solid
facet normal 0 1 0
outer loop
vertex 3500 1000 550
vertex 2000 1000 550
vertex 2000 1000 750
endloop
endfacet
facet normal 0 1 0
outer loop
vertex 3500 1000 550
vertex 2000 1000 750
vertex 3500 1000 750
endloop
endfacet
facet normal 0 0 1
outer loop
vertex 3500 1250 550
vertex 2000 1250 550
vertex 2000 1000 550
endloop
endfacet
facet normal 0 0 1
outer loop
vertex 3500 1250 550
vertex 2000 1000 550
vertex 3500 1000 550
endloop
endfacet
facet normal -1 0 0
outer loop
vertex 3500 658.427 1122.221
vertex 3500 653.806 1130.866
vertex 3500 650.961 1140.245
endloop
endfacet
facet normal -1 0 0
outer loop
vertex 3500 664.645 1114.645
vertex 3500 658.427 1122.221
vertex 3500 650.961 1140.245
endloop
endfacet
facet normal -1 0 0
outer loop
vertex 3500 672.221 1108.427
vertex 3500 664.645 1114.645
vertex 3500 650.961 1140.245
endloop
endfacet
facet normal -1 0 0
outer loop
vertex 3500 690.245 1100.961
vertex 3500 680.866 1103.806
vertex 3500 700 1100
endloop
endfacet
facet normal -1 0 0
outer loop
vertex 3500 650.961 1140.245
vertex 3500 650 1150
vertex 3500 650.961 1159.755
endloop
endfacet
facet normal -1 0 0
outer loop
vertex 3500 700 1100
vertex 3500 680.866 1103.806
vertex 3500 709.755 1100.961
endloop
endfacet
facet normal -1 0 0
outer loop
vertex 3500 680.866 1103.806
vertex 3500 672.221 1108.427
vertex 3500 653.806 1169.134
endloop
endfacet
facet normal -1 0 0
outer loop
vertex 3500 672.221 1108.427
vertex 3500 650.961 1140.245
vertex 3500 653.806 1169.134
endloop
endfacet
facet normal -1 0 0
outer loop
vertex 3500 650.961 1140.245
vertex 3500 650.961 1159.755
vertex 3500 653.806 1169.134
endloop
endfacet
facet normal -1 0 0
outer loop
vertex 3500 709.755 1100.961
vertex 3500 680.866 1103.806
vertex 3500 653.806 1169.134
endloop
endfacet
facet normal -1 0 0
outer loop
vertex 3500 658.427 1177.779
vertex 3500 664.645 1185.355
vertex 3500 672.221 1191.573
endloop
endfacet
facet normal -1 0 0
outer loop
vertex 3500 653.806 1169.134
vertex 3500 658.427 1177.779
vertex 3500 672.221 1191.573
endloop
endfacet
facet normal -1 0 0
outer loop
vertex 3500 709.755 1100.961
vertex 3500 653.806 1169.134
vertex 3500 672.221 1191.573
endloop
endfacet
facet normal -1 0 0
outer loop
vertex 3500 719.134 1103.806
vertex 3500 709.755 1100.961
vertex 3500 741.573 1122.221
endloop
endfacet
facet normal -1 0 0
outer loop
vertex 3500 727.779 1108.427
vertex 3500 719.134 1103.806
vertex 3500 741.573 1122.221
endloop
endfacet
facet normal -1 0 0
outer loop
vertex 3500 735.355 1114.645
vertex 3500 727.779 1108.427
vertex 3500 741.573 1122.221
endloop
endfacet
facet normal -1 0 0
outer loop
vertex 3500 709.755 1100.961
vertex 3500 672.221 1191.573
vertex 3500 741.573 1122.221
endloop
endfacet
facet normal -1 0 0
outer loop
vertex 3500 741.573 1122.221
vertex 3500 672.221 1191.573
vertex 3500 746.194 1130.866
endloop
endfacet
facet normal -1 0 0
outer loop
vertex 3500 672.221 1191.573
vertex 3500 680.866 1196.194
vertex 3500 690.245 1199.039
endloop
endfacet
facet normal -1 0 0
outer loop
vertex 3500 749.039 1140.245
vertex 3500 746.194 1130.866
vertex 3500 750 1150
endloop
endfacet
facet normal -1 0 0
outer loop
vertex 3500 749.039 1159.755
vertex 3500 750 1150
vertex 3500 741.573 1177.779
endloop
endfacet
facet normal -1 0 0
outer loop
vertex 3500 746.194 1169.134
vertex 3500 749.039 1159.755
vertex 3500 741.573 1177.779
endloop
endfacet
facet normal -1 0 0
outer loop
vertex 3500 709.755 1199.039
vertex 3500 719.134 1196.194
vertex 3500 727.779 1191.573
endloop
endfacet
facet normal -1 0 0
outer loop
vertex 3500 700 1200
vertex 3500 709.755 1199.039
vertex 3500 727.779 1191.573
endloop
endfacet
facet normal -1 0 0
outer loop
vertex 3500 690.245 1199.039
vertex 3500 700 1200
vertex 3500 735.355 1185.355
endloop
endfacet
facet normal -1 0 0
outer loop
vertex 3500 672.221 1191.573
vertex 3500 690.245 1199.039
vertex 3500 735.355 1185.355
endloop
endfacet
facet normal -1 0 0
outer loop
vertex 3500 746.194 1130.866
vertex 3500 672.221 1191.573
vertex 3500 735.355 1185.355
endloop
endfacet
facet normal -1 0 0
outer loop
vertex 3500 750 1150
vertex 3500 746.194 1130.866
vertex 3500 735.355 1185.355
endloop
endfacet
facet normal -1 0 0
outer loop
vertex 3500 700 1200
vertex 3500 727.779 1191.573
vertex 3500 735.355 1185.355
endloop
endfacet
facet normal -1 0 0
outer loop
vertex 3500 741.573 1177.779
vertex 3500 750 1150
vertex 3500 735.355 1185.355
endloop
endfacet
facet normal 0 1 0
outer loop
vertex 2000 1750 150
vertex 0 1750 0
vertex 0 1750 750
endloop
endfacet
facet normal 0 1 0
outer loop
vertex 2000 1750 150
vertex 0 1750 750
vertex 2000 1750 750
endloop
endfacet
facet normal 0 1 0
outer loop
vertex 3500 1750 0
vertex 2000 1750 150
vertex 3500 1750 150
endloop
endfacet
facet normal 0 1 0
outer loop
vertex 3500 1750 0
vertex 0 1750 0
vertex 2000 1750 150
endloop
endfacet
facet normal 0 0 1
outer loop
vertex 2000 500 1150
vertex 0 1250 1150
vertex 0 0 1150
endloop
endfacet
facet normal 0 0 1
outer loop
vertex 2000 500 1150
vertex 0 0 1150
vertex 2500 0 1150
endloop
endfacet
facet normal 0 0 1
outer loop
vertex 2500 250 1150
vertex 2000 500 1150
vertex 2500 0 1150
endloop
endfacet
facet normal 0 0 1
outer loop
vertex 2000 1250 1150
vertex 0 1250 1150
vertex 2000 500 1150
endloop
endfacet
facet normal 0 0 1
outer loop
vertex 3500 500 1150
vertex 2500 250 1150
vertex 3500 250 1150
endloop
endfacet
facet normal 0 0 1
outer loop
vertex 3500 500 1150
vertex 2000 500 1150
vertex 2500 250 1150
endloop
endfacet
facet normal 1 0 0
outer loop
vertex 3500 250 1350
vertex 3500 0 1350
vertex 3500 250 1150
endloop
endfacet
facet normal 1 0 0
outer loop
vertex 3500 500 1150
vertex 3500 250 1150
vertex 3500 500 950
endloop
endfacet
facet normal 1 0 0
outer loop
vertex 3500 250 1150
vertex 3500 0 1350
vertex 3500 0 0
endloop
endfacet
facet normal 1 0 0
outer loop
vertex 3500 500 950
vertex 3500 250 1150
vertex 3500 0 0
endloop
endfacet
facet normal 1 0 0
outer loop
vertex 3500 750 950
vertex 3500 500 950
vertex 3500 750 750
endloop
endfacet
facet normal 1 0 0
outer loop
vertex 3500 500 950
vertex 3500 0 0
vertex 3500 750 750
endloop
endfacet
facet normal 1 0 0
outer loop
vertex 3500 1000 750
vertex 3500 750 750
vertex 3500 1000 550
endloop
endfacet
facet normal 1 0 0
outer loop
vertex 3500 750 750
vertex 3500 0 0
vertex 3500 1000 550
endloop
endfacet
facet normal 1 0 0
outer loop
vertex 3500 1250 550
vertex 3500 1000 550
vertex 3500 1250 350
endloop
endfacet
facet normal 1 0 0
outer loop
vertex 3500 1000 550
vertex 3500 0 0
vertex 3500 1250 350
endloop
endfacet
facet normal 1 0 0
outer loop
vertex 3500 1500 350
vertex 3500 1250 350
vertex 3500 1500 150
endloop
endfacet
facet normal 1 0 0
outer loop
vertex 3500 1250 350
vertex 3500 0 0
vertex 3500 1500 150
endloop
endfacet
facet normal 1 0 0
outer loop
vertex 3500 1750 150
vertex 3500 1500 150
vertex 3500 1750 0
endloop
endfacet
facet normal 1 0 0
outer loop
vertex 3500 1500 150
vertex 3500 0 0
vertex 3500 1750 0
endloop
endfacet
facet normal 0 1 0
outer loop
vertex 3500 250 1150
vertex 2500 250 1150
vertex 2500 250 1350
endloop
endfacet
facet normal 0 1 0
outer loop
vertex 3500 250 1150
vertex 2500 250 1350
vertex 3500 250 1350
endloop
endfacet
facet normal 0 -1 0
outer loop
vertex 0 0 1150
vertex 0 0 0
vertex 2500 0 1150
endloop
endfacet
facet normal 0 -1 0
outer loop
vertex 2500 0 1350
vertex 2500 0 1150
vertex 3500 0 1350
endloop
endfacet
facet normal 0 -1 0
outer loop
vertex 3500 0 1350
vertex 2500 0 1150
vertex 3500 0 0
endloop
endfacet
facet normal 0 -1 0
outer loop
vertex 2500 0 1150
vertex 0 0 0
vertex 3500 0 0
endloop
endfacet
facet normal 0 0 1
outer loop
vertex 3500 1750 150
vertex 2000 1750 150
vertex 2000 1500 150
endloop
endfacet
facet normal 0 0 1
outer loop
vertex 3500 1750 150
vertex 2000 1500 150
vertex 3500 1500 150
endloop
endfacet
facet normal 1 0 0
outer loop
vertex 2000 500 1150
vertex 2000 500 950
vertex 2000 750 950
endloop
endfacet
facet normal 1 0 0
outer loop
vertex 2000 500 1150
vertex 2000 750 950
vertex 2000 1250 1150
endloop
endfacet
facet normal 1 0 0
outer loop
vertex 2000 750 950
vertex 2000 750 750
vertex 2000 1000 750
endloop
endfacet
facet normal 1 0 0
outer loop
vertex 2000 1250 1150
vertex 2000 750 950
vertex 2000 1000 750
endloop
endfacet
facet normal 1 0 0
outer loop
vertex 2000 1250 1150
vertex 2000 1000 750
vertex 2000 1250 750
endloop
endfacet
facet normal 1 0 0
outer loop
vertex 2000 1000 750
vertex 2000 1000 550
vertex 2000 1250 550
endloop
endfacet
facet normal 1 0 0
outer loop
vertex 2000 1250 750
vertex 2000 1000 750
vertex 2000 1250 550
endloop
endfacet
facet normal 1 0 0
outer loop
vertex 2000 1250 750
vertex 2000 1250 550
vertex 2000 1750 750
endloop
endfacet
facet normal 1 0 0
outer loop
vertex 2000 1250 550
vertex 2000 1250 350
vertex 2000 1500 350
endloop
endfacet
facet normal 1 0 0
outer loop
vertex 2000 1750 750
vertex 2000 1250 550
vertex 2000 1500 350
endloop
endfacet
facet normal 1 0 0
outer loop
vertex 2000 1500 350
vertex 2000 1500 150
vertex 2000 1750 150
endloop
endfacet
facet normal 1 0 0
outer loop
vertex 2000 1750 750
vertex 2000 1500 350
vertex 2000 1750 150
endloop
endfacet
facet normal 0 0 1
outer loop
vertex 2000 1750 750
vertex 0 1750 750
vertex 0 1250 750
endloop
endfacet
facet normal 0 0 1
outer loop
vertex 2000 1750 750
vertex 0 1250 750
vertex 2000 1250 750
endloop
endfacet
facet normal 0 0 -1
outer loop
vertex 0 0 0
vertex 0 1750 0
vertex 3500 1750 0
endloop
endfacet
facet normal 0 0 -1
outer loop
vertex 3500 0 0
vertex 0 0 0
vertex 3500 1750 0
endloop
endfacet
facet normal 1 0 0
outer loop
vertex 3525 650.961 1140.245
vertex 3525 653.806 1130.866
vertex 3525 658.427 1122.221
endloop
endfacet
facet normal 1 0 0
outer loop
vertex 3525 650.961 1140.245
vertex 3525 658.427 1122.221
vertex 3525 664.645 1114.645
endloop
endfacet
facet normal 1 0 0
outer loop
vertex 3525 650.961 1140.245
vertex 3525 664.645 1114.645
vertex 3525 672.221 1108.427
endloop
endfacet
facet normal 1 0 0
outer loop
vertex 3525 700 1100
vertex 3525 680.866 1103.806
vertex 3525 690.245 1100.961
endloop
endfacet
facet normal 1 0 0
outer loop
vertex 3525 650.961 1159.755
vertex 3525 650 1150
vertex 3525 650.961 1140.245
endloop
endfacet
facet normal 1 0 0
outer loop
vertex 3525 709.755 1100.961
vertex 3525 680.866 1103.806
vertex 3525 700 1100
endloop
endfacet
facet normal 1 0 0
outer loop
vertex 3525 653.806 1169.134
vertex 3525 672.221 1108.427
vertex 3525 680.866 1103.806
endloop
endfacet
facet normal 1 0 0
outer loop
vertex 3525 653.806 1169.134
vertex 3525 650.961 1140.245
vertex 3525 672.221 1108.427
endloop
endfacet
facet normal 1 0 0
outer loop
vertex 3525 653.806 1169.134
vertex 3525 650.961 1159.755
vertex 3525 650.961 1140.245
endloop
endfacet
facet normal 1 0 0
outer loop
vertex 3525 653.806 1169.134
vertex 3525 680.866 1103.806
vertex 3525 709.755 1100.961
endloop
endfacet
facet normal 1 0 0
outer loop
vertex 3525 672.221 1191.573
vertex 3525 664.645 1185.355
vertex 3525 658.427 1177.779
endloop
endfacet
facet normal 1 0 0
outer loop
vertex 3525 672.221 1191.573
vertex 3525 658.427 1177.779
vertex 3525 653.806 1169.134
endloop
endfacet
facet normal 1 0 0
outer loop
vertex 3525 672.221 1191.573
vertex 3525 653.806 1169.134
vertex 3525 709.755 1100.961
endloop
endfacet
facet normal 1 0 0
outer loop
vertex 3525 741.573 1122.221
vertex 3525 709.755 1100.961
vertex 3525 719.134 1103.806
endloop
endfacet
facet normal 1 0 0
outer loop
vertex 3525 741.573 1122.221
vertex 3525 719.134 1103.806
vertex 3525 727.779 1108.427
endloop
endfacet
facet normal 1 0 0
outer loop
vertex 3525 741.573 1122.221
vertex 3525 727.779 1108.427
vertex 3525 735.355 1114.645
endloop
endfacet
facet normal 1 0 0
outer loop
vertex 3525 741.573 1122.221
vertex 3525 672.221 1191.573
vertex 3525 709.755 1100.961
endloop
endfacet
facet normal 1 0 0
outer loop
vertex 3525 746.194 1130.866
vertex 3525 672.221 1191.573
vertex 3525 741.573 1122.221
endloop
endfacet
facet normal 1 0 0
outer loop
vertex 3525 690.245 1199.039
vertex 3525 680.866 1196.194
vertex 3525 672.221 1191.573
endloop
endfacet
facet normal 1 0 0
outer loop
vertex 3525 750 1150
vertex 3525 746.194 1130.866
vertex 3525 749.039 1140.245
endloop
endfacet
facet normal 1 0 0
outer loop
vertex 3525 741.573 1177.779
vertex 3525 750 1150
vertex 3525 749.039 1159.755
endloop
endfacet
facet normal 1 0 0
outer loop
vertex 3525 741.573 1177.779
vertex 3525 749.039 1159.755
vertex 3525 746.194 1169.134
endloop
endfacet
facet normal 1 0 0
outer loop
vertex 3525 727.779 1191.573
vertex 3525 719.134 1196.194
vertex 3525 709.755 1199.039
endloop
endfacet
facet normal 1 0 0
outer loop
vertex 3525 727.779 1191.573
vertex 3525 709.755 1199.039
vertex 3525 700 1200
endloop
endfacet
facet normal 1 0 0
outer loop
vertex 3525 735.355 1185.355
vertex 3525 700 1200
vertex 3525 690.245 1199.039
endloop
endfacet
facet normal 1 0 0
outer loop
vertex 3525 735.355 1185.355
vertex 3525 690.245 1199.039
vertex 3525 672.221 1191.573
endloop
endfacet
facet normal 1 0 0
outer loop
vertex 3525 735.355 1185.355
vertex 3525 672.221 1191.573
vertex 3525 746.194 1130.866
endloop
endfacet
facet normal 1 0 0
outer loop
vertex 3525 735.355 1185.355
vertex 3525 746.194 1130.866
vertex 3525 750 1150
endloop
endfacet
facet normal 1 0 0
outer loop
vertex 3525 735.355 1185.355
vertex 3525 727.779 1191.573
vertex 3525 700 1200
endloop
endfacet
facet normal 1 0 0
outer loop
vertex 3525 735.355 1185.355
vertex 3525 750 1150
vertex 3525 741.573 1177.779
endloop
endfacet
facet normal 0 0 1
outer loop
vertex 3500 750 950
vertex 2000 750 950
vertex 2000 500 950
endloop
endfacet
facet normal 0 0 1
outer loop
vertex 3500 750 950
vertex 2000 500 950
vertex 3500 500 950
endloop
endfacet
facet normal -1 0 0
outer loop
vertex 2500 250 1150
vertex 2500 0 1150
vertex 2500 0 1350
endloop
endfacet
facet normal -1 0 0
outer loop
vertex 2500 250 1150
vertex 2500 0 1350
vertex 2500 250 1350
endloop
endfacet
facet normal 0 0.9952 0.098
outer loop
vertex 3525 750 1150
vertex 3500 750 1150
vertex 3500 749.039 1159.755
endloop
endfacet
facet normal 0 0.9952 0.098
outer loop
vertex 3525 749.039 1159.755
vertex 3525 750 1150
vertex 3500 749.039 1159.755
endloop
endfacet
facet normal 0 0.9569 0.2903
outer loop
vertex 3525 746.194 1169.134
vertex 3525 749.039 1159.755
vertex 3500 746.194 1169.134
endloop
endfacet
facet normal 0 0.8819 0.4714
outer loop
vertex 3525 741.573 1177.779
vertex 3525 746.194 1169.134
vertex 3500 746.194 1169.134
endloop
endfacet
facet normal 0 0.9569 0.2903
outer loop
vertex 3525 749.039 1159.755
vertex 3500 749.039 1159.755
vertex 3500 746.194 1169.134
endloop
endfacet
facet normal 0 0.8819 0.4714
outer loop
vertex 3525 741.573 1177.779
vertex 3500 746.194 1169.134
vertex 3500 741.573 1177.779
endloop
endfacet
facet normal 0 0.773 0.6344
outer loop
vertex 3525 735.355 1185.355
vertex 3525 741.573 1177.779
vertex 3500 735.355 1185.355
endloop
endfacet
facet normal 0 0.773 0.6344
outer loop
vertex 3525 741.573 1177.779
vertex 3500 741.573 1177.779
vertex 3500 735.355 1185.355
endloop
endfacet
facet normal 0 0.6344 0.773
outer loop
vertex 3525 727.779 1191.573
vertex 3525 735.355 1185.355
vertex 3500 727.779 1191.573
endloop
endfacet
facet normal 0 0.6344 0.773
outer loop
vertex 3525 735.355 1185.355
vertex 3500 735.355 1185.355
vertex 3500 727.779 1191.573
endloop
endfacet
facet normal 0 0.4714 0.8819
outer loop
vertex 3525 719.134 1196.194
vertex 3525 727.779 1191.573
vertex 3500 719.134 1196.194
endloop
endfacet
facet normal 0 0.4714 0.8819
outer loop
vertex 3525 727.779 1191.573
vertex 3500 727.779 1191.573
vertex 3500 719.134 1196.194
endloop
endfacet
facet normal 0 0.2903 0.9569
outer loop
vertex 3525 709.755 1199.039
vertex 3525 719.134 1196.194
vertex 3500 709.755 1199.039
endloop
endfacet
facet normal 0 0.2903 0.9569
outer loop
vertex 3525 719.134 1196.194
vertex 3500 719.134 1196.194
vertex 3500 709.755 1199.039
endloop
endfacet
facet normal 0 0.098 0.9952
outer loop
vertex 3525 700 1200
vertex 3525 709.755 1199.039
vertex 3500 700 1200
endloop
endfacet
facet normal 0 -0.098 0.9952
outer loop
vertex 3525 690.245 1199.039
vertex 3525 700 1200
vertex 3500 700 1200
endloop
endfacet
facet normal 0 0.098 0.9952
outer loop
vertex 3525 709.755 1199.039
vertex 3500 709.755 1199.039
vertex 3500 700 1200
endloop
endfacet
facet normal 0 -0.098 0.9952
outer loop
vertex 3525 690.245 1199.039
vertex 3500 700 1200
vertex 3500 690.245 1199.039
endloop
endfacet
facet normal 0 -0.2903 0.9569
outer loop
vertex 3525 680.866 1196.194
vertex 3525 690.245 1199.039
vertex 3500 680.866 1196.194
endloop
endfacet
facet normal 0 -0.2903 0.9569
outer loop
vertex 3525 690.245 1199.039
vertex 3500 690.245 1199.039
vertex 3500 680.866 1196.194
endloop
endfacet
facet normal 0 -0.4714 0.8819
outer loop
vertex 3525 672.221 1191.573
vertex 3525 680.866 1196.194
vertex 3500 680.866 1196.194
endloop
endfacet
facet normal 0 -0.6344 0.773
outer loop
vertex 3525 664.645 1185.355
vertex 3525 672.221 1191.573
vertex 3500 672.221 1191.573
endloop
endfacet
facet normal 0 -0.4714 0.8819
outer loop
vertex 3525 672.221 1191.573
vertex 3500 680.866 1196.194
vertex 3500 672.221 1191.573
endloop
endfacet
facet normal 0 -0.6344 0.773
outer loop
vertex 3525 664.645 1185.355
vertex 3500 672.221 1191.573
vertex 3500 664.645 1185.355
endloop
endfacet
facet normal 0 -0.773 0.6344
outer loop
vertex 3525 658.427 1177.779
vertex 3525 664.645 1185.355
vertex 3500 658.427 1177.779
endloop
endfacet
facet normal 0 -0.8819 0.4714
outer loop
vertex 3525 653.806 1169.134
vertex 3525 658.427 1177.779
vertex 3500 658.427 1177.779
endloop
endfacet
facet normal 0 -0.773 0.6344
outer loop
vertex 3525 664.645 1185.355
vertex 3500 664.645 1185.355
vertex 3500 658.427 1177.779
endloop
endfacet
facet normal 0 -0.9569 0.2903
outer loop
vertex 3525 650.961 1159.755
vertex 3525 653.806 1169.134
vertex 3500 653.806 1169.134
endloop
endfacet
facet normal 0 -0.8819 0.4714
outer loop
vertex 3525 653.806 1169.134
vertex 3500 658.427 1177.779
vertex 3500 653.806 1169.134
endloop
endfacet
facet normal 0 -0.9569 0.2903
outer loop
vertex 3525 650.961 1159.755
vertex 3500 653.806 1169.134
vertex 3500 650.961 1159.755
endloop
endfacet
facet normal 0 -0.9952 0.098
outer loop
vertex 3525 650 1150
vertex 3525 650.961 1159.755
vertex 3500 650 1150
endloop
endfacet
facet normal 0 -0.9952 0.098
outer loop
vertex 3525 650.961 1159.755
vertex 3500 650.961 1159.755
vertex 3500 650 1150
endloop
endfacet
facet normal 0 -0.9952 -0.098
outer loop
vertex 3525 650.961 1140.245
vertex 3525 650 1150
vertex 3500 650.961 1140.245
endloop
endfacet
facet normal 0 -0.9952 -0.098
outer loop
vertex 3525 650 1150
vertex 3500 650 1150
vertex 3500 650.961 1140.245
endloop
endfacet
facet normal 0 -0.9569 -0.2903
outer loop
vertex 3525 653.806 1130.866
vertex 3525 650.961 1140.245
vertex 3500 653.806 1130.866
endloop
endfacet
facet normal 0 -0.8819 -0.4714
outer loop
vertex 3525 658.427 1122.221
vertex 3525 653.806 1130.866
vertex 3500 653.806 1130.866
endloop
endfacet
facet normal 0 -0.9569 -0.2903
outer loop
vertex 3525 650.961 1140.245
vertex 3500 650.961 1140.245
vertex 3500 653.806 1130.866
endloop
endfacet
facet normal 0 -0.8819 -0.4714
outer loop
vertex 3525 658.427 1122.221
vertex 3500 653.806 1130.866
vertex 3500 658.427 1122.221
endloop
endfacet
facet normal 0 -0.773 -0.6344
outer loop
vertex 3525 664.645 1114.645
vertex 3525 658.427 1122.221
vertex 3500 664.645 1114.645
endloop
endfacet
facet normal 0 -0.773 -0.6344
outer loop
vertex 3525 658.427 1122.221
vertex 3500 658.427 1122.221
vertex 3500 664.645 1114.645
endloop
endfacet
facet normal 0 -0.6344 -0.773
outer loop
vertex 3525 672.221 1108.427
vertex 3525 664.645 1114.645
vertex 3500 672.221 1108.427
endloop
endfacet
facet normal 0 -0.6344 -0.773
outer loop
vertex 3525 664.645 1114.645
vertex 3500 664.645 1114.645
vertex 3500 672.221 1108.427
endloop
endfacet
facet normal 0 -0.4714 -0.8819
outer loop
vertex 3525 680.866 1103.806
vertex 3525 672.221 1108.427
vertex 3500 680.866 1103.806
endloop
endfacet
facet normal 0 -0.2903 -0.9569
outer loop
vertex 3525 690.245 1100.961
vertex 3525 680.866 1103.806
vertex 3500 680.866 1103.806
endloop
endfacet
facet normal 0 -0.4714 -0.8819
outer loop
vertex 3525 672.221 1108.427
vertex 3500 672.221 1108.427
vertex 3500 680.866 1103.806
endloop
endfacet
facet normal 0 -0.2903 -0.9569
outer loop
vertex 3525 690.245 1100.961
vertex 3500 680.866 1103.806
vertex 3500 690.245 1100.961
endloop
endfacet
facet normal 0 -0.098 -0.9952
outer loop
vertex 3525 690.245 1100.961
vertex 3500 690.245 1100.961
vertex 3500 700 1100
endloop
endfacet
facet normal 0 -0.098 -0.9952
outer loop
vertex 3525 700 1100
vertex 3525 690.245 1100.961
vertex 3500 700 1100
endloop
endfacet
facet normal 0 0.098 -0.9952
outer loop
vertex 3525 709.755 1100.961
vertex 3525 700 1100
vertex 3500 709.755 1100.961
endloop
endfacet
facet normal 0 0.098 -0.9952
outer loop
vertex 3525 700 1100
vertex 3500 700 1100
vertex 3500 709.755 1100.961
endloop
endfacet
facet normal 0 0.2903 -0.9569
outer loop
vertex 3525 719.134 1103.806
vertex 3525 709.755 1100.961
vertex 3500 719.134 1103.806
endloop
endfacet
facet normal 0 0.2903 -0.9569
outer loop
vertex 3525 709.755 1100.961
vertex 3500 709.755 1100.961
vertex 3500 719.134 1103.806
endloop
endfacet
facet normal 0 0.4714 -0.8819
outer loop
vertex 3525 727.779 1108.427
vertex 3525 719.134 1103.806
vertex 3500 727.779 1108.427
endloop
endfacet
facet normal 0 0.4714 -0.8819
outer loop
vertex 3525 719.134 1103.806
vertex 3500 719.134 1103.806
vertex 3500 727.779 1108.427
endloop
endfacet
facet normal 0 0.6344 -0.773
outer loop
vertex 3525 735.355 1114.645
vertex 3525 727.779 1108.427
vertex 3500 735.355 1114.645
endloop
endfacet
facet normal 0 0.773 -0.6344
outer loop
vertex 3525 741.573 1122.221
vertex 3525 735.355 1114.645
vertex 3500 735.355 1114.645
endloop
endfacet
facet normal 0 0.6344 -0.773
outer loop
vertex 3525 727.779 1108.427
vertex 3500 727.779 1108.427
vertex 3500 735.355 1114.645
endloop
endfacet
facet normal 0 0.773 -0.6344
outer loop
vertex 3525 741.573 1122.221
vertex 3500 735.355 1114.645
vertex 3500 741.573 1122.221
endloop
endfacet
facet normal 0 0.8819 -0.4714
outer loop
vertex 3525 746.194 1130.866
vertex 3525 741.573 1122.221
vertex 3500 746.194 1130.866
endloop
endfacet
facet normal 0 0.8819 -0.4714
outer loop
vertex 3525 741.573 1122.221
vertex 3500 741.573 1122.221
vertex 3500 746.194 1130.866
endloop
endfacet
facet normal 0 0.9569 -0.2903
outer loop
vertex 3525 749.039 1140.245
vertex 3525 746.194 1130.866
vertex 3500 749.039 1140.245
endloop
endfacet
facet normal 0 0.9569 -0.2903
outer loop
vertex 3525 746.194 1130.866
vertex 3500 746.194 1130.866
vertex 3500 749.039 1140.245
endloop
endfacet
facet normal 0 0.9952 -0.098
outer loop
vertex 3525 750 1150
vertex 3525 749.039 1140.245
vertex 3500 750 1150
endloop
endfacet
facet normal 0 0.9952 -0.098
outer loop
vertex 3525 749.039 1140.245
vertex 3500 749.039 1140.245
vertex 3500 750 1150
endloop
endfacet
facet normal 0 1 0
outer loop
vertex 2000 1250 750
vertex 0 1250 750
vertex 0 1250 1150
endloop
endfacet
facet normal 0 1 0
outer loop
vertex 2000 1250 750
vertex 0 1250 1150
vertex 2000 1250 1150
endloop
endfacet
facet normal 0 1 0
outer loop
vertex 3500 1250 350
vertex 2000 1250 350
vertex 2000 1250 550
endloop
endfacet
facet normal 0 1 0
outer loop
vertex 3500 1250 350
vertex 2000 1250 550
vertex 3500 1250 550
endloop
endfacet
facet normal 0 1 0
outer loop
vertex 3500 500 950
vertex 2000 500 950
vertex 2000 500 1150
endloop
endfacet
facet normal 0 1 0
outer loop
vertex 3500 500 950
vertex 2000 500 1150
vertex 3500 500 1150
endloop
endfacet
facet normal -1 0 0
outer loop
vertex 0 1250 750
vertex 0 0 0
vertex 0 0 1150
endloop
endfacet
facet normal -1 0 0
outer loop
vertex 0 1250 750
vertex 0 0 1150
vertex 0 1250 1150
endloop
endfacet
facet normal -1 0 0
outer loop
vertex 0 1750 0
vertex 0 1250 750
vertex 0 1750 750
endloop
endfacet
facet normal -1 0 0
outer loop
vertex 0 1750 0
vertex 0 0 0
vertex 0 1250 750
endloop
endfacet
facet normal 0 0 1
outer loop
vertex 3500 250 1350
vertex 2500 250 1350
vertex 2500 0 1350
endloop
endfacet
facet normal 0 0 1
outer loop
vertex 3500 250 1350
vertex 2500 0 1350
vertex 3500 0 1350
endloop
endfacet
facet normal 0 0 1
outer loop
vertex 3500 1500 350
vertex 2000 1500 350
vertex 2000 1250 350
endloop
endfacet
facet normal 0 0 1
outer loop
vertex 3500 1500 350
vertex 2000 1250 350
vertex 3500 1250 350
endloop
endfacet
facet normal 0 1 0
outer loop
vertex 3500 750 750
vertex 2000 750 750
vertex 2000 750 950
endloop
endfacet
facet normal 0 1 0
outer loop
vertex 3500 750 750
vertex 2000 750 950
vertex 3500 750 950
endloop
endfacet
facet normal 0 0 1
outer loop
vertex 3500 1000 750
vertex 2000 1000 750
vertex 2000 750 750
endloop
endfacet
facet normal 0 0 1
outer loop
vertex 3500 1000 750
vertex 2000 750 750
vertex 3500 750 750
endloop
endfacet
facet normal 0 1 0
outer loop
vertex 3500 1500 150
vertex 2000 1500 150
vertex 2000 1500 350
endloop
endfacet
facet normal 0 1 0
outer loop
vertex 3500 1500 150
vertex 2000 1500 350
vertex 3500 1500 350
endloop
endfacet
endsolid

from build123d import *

# Parameters (mm, degrees)
F0_W      = 3500
F0_H      = 1750
F1_DEPTH  = 150
F2_W      = 1500
F2_H      = 1500
F3_DEPTH  = 200
F4_W      = 1500
F4_H      = 1250
F5_DEPTH  = 200
F6_W      = 1500
F6_H      = 1000
F7_DEPTH  = 200
F8_W      = 1500
F8_H      = 750
F9_DEPTH  = 200
F10_W     = 1500
F10_H     = 500
F11_DEPTH = 200
F12_R     = 50
F13_DEPTH = 25
F14_W     = 2000
F14_H     = 1250
F15_DEPTH = 1000
F16_W     = 2000
F16_H     = 500
F17_DEPTH = 600
F18_W     = 1000
F18_H     = 250
F19_DEPTH = 200


with BuildPart() as f1:
    # F0 (on Top) → F1 (new body)
    with BuildSketch(Plane.XY):
        with Locations((1750, 875)):
            Rectangle(F0_W, F0_H)
    extrude(amount=F1_DEPTH)

    # F2 (on face) → F3 (join)
    with BuildSketch(Plane.XY.offset(150)):
        with Locations((2750, 750)):
            Rectangle(F2_W, F2_H)
    extrude(amount=F3_DEPTH)

    # F4 (on face) → F5 (join)
    with BuildSketch(Plane.XY.offset(350)):
        with Locations((2750, 625)):
            Rectangle(F4_W, F4_H)
    extrude(amount=F5_DEPTH)

    # F6 (on face) → F7 (join)
    with BuildSketch(Plane.XY.offset(550)):
        with Locations((2750, 500)):
            Rectangle(F6_W, F6_H)
    extrude(amount=F7_DEPTH)

    # F8 (on face) → F9 (join)
    with BuildSketch(Plane.XY.offset(750)):
        with Locations((2750, 375)):
            Rectangle(F8_W, F8_H)
    extrude(amount=F9_DEPTH)

    # F10 (on face) → F11 (join)
    with BuildSketch(Plane.XY.offset(950)):
        with Locations((2750, 250)):
            Rectangle(F10_W, F10_H)
    extrude(amount=F11_DEPTH)

    # F14 (on face) → F15 (join)
    with BuildSketch(Plane.XY.offset(150)):
        with Locations((1000, 625)):
            Rectangle(F14_W, F14_H)
    extrude(amount=F15_DEPTH)

    # F16 (on face) → F17 (join)
    with BuildSketch(Plane.XY.offset(150)):
        with Locations((1000, 1500)):
            Rectangle(F16_W, F16_H)
    extrude(amount=F17_DEPTH)

    # F18 (on face) → F19 (join)
    with BuildSketch(Plane.XY.offset(1150)):
        with Locations((3000, 125)):
            Rectangle(F18_W, F18_H)
    extrude(amount=F19_DEPTH)


with BuildPart() as f13:
    # F12 (on face) → F13 (new body)
    with BuildSketch(Plane.YZ.offset(3500)):
        with Locations((700, 1150)):
            Circle(F12_R)
    extrude(amount=F13_DEPTH)


solid = Compound([f1.part, f13.part])
